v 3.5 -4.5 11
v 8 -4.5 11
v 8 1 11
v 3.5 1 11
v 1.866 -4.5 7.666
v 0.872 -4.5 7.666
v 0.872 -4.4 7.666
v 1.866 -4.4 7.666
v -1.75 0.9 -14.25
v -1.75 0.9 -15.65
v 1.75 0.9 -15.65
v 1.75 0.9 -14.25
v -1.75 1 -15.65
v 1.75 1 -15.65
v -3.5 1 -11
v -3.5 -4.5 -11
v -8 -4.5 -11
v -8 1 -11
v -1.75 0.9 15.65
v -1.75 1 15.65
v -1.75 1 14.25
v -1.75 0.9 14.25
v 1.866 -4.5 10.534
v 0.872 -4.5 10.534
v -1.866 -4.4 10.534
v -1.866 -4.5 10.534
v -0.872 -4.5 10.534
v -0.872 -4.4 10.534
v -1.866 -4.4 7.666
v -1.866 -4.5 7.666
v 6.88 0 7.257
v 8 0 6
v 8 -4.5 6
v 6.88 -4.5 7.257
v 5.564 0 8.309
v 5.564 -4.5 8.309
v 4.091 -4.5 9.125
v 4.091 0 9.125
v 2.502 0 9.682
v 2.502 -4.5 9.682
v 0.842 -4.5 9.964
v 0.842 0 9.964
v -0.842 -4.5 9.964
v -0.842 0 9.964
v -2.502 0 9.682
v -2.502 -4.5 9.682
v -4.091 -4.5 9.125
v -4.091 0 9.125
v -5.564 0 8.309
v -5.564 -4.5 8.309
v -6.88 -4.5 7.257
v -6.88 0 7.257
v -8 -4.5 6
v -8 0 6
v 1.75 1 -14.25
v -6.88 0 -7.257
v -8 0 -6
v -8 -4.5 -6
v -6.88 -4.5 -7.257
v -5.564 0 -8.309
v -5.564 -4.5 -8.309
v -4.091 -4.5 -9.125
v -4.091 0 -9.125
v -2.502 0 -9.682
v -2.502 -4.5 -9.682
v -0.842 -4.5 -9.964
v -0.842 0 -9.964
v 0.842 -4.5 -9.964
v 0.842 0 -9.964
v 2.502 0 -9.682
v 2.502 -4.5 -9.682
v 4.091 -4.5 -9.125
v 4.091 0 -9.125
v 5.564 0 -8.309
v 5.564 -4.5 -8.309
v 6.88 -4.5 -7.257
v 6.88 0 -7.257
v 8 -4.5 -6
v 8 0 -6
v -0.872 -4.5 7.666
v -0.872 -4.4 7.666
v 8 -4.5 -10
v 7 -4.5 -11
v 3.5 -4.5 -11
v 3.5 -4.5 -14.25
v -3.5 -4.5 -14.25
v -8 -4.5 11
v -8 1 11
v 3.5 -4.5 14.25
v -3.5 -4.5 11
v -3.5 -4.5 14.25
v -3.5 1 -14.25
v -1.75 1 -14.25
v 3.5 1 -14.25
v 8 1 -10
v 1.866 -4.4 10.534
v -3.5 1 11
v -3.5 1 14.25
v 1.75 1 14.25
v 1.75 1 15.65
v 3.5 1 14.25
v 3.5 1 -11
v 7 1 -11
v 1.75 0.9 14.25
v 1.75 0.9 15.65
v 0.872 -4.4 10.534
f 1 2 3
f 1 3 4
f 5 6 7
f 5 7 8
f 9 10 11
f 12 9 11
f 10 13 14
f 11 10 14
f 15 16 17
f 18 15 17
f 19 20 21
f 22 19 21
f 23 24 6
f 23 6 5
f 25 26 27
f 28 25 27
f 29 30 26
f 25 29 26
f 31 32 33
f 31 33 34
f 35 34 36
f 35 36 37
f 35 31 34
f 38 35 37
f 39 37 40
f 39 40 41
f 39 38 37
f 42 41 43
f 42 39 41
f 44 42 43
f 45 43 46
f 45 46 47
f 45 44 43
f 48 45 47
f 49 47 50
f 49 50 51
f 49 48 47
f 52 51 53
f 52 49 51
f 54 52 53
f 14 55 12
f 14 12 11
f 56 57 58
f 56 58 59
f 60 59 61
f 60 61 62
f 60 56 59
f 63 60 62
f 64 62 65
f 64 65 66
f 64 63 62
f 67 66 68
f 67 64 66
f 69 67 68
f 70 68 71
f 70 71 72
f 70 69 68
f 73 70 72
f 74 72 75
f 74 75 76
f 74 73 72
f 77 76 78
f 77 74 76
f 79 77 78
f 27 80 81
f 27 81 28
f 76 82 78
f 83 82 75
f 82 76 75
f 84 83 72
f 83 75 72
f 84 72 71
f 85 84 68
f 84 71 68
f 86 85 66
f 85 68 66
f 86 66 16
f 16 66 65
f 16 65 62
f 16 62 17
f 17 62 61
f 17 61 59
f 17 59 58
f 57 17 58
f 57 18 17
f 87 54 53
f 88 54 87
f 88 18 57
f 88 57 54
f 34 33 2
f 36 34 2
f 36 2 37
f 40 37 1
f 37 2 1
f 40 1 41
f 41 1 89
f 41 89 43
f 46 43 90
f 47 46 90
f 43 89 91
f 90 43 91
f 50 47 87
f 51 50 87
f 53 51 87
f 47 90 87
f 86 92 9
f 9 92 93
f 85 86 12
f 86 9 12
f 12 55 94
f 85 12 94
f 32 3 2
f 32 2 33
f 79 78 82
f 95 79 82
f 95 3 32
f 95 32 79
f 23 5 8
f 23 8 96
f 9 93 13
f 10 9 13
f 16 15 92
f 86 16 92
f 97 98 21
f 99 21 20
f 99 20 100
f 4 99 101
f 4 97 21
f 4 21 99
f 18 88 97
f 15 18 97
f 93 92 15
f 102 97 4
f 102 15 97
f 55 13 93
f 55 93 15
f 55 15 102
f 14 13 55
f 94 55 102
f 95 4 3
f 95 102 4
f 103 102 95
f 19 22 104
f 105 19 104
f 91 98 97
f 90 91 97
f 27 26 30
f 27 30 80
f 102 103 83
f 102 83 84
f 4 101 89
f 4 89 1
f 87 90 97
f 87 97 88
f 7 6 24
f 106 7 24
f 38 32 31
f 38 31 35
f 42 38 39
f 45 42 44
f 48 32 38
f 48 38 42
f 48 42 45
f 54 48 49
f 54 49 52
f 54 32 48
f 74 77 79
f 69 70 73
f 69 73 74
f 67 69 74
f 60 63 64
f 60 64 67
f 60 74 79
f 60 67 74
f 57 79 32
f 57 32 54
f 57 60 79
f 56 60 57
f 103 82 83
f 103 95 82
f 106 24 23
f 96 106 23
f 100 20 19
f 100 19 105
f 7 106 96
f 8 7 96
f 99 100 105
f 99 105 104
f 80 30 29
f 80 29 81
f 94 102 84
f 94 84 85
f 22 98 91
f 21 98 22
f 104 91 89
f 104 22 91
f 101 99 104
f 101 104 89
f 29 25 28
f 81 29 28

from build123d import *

# Parameters (mm, degrees)
BOSS_EXTRUDE1_DEPTH   = 1
BOSS_EXTRUDE2_DEPTH   = 4.5
SKETCH3_W             = 7
SKETCH3_H             = 3.25
BOSS_EXTRUDE3_DEPTH   = 5.5
SKETCH4_W             = 3.5
SKETCH4_H             = 31.3
BOSS_EXTRUDE4_DEPTH   = 0.1
SKETCH5_W             = 0.994211342
SKETCH5_H             = 2.867053464
BOSS_EXTRUDE6_DEPTH   = 0.1
BOSS_EXTRUDE6_2_DEPTH = 0.1


with BuildPart() as part:
    # Sketch1 → Boss-Extrude1 (new body)
    with BuildSketch(Plane(origin=(0, 0, 0), x_dir=(1, 0, 0), z_dir=(0, 1, 0))):
        Polygon((7, 11), (8, 10), (8, -11), (-8, -11), (-8, 11), align=None)
    extrude(amount=BOSS_EXTRUDE1_DEPTH)

    # Sketch2 → Boss-Extrude2 (add)
    with BuildSketch(Plane.XZ):
        with BuildLine():
            Line((-8, -11), (-8, -6))
            ThreePointArc((-8, -6), (0, -10), (8, -6))
            Line((8, -6), (8, -10))
            Line((8, -10), (7, -11))
            Line((7, -11), (-8, -11))
        make_face()
        with BuildLine():
            Line((-8, 11), (8, 11))
            Line((8, 11), (8, 6))
            ThreePointArc((8, 6), (0, 10), (-8, 6))
            Line((-8, 6), (-8, 11))
        make_face()
    extrude(amount=BOSS_EXTRUDE2_DEPTH)

    # Sketch3 → Boss-Extrude3 (add)
    with BuildSketch(Plane(origin=(0, 1, 0), x_dir=(1, 0, 0), z_dir=(0, 1, 0))):
        with Locations((0, -12.625)):
            Rectangle(SKETCH3_W, SKETCH3_H)
        with Locations((0, 12.625)):
            Rectangle(SKETCH3_W, SKETCH3_H)
    extrude(amount=-BOSS_EXTRUDE3_DEPTH)

    # Sketch4 → Boss-Extrude4 (add)
    with BuildSketch(Plane(origin=(0, 1, 0), x_dir=(1, 0, 0), z_dir=(0, 1, 0))):
        Rectangle(SKETCH4_W, SKETCH4_H)
    extrude(amount=-BOSS_EXTRUDE4_DEPTH)


with BuildPart() as body_2:
    # Sketch5 → Boss-Extrude6 (new body)
    with BuildSketch(Plane.XZ.offset(4.5)):
        with Locations((1.369350497, 9.099983086)):
            Rectangle(SKETCH5_W, SKETCH5_H)
    extrude(amount=-BOSS_EXTRUDE6_DEPTH)


with BuildPart() as body_3:
    # Sketch5 → Boss-Extrude6 2 (new body)
    with BuildSketch(Plane.XZ.offset(4.5)):
        with Locations((-1.369350497, 9.099983086)):
            Rectangle(SKETCH5_W, SKETCH5_H)
    extrude(amount=-BOSS_EXTRUDE6_2_DEPTH)


solid = Compound([part.part, body_2.part, body_3.part])
